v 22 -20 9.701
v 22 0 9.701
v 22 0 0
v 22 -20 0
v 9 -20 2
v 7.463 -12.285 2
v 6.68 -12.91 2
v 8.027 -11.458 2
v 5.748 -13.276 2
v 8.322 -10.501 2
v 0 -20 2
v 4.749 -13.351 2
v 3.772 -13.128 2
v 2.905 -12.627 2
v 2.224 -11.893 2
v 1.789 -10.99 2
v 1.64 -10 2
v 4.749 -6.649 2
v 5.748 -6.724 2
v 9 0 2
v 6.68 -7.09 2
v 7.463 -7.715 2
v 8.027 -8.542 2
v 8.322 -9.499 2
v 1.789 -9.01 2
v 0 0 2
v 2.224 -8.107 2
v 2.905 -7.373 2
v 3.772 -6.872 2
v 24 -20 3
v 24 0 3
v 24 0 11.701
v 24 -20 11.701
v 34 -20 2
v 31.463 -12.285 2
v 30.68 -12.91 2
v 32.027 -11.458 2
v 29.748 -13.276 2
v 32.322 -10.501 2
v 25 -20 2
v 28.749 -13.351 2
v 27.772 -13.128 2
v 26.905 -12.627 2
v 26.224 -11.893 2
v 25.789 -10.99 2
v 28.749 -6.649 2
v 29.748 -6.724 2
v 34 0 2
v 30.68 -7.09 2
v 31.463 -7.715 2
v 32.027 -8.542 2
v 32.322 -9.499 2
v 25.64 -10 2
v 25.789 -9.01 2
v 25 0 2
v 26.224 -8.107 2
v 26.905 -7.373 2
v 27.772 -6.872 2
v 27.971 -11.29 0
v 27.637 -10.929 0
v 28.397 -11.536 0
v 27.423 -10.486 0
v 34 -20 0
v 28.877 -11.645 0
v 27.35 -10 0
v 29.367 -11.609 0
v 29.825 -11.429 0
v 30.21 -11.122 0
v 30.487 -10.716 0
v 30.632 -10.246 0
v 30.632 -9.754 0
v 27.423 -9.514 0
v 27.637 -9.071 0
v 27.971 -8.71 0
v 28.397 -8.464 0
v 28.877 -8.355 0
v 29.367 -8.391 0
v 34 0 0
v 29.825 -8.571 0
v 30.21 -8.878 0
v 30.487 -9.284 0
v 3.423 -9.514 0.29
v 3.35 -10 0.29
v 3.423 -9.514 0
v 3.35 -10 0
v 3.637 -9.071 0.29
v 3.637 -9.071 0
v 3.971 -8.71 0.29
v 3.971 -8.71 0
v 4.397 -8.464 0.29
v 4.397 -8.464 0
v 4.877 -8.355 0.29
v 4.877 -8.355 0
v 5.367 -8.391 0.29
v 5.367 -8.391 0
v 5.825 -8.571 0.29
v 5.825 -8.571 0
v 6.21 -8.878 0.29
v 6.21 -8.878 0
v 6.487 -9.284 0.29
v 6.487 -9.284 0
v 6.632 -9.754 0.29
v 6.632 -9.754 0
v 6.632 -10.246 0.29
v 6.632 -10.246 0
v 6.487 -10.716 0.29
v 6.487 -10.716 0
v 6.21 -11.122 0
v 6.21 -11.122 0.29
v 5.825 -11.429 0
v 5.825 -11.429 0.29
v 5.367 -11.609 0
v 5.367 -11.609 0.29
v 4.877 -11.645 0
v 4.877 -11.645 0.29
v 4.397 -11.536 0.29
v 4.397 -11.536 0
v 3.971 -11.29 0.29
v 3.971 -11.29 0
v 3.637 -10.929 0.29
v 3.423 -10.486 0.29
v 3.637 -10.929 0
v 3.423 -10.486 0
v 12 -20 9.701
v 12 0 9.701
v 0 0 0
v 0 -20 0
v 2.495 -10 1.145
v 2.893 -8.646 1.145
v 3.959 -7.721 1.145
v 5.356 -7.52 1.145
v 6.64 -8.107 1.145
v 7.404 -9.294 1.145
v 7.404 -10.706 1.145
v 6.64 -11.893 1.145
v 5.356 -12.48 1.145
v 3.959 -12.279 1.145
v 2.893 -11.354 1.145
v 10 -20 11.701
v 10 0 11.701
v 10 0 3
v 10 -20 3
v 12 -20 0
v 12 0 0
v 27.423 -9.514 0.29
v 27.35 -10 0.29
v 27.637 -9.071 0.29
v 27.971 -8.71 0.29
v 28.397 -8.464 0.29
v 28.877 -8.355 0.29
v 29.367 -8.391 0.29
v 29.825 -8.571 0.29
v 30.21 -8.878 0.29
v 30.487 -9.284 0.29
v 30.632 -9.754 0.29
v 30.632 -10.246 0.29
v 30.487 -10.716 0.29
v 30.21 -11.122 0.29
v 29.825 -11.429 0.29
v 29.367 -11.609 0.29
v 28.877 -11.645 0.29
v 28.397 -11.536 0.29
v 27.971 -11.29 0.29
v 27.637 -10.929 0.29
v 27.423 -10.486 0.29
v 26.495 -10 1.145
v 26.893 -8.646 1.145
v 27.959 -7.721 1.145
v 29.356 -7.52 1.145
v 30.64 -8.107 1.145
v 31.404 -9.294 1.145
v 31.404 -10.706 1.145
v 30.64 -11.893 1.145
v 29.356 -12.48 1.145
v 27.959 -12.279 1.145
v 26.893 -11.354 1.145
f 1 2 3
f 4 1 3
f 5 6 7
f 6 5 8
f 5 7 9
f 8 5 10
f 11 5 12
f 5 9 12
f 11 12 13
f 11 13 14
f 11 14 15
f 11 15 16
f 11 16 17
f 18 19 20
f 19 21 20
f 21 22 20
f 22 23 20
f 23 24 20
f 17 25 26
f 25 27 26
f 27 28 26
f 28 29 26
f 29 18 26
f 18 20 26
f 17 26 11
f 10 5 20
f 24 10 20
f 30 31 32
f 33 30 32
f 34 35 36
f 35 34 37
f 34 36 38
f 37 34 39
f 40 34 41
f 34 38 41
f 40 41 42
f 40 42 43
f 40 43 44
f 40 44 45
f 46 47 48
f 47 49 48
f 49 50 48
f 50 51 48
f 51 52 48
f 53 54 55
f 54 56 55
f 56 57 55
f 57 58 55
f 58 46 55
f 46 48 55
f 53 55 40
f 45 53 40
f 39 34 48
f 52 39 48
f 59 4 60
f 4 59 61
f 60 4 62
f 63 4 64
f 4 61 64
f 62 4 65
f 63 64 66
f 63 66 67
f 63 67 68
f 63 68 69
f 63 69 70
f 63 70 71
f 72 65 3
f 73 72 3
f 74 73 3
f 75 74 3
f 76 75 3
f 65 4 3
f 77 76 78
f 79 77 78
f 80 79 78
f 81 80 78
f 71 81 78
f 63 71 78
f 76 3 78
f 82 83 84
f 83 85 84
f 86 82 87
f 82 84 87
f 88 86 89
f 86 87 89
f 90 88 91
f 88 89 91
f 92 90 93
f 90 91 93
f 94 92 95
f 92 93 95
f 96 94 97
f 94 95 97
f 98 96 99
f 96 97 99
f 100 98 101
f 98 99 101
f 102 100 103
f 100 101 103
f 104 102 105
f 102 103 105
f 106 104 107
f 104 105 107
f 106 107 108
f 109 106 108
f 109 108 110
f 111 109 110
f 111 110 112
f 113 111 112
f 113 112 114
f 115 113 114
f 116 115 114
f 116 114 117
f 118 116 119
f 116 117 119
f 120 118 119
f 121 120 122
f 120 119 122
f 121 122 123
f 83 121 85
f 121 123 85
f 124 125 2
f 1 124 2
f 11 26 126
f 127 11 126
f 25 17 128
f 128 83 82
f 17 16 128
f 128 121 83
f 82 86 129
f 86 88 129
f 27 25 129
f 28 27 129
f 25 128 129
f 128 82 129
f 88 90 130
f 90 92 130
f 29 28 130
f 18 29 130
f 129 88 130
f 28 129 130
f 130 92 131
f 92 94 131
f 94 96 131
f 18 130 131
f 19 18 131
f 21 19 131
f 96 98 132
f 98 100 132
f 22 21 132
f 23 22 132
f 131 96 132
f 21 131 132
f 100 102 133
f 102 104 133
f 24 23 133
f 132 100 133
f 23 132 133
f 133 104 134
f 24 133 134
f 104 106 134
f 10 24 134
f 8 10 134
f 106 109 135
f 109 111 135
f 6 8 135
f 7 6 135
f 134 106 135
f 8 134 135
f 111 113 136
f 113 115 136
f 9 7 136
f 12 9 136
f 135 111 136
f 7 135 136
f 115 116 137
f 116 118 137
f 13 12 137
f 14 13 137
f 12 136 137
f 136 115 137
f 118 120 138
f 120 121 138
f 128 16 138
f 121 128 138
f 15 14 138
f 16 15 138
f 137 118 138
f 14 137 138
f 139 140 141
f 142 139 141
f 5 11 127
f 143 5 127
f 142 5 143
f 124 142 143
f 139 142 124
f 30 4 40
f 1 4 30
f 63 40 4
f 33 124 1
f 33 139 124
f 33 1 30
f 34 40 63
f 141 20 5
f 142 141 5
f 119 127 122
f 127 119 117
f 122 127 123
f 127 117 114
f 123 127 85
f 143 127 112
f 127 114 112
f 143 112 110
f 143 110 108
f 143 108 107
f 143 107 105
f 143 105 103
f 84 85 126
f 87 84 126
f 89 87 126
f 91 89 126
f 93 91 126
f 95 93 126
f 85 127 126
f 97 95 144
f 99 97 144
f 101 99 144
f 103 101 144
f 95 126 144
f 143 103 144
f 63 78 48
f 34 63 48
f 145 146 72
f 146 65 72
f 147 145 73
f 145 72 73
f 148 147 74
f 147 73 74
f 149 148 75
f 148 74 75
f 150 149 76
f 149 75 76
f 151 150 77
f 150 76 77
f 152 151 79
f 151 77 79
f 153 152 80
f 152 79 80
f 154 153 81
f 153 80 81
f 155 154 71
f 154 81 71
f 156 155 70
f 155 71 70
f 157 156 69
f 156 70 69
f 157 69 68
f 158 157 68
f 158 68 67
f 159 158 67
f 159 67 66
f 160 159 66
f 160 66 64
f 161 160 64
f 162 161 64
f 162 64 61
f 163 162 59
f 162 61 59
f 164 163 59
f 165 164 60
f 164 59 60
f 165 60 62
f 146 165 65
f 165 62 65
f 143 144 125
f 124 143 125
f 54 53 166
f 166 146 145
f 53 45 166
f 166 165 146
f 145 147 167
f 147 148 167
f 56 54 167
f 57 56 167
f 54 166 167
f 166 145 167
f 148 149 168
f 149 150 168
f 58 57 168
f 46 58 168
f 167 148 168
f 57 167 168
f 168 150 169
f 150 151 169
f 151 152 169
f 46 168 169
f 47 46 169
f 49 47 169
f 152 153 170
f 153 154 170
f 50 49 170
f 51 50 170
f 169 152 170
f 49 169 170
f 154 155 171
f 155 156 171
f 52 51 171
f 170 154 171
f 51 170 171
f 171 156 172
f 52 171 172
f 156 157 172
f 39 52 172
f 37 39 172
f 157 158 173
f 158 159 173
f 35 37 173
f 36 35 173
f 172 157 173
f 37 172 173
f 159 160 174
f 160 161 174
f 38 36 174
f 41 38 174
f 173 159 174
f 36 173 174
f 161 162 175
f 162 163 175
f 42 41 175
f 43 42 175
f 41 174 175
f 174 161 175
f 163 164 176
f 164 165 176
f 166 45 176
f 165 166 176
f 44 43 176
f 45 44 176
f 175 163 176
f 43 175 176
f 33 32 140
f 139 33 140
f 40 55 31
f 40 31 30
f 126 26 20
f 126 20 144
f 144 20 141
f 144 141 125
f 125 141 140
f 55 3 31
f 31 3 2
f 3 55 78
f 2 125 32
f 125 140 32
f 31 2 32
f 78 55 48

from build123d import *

# Parameters (mm, degrees)
F1_DEPTH             = 20
F4_D                 = 3.3
F4_CSINK_D           = 6.72
F4_CSINK_ANGLE       = 90
F4_ON_F2_D           = 3.3
F4_ON_F2_CSINK_D     = 6.72
F4_ON_F2_CSINK_ANGLE = 90
F5_SIZE              = 1


with BuildPart() as f1:
    # F0 (on Front) → F1 (new body)
    with BuildSketch(Plane.XZ):
        Polygon((0, 2), (0, 0), (12, 0), (12, 9.7012996929), (22, 9.7012996929), (22, 0), (34, 0), (34, 2), (24, 2), (24, 11.7012996929), (10, 11.7012996929), (10, 2), align=None)
    extrude(amount=F1_DEPTH)

    # F4 (through all)
    with Locations(Plane.XY.offset(2)):
        with Locations((5, -10)):
            CounterSinkHole(F4_D / 2, F4_CSINK_D / 2, counter_sink_angle=F4_CSINK_ANGLE)

    # F4 on F2 (through all)
    with Locations(Plane.XY.offset(2)):
        with Locations((29, -10)):
            CounterSinkHole(F4_ON_F2_D / 2, F4_ON_F2_CSINK_D / 2, counter_sink_angle=F4_ON_F2_CSINK_ANGLE)

    # F5
    f5_edges = [f1.edges().sort_by_distance(p)[0] for p in [
        (24, -10, 2),
        (10, -10, 2),
    ]]
    chamfer(f5_edges, length=F5_SIZE)


solid = f1.part
